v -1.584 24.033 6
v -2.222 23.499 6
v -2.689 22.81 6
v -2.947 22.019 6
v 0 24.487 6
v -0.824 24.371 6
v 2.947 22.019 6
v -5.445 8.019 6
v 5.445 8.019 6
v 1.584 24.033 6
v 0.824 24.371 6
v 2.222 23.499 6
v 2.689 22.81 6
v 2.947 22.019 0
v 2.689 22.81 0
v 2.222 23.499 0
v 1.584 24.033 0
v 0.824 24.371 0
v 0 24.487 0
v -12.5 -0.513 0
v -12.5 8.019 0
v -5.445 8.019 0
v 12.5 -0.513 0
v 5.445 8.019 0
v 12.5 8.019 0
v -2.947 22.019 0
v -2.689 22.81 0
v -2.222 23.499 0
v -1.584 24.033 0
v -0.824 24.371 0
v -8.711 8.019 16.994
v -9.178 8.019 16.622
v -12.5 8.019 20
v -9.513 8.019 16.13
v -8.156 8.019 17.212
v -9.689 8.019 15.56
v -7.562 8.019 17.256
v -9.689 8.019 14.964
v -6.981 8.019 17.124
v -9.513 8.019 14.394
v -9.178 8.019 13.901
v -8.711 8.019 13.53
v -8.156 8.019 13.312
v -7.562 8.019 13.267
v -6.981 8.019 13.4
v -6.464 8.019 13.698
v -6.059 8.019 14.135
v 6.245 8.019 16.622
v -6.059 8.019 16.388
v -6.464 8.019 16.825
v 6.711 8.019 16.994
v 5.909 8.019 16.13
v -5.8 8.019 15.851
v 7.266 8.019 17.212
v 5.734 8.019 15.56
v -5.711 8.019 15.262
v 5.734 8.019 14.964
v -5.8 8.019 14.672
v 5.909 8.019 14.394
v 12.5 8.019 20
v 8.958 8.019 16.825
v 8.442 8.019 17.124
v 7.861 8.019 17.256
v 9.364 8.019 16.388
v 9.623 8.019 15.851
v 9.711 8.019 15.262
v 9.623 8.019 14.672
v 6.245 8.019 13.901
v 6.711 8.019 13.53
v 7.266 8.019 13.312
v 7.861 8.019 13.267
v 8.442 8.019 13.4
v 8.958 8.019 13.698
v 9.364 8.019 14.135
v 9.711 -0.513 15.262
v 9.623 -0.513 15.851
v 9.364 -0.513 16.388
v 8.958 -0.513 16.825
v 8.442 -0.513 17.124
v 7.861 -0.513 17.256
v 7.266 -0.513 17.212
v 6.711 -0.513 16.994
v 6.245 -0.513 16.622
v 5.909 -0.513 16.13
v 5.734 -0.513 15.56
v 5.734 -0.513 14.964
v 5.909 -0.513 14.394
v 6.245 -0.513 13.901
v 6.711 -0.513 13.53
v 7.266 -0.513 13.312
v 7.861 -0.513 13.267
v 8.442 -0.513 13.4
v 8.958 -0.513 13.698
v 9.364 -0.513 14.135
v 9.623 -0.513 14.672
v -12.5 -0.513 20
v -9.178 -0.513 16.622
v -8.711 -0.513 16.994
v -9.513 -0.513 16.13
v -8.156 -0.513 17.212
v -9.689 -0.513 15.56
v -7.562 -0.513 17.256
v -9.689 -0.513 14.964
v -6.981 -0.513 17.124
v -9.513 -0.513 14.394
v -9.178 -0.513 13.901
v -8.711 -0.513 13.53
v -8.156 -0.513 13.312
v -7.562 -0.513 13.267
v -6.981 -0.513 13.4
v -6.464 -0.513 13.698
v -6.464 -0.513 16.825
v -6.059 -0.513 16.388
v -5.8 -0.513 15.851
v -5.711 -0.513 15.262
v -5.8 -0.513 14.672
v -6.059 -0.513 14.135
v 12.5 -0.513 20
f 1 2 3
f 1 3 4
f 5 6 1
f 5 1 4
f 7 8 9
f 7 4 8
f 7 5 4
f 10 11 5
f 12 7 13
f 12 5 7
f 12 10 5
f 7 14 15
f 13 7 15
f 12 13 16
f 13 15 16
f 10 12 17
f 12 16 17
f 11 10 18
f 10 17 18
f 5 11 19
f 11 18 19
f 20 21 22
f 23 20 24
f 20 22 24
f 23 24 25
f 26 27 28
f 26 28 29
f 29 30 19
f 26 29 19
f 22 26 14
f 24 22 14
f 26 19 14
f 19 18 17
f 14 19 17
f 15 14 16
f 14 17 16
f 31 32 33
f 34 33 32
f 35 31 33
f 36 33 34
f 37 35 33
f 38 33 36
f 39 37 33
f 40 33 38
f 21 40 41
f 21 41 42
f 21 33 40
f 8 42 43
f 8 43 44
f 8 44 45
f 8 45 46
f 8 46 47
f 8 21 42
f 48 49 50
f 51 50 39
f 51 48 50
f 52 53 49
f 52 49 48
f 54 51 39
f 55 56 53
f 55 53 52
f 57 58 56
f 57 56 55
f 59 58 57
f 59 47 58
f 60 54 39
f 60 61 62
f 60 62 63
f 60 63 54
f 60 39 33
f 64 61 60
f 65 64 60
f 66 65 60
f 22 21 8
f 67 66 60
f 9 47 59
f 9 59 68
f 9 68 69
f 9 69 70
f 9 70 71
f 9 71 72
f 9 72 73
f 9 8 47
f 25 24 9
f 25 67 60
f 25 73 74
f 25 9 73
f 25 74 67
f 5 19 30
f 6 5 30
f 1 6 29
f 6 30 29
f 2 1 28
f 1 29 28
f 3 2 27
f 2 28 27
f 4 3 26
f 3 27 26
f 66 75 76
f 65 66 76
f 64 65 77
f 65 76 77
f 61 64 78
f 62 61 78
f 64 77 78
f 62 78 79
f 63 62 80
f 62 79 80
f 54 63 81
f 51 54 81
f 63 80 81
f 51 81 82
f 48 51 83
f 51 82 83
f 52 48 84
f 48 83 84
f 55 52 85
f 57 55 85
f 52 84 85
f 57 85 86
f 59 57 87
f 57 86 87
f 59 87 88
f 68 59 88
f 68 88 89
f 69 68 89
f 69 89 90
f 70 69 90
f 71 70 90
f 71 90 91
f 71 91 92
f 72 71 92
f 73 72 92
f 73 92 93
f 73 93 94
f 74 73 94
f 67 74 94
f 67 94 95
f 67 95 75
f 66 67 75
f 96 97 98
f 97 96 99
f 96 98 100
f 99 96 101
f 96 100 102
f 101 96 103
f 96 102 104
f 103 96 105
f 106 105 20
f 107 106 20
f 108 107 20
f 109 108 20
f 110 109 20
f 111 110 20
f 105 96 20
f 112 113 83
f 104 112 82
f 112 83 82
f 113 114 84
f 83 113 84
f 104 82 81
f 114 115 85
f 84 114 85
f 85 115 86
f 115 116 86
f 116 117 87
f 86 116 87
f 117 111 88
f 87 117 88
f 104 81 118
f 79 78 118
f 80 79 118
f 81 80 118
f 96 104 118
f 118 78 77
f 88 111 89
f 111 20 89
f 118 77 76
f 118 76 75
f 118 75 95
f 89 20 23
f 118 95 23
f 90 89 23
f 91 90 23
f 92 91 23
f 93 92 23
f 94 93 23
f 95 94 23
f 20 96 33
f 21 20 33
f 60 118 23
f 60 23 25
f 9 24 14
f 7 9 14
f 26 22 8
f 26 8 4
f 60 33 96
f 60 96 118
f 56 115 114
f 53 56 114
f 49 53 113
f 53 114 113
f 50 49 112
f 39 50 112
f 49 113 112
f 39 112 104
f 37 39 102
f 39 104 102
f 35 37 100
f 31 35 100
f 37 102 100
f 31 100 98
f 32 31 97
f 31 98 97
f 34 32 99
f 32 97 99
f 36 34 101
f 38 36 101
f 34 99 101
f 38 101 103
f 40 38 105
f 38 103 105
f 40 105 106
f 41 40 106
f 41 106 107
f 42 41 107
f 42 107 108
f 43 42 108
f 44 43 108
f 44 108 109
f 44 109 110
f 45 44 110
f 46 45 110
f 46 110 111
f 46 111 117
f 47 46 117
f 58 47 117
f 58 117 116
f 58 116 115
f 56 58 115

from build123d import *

# Parameters (mm, degrees)
PAD_DEPTH    = 6
SKETCH_W     = 25
SKETCH_H     = 8.532326
PAD001_DEPTH = 14
SKETCH002_R  = 2
POCKET_DEPTH = 25.001


with BuildPart() as part:
    # Sketch001 → Pad (new body)
    with BuildSketch(Plane.XY):
        with BuildLine():
            Line((0, -0.513451), (12.5, -0.513451))
            Line((12.5, -0.513451), (12.5, 8.018875))
            Line((12.5, 8.018875), (5.444822, 8.018875))
            Line((5.444822, 8.018875), (2.947073, 22.018734))
            ThreePointArc((2.947073, 22.018734), (1.921936, 23.788122), (0, 24.486549))
            ThreePointArc((0, 24.486549), (-1.921936, 23.788122), (-2.947073, 22.018734))
            Line((-5.444822, 8.018875), (-2.947073, 22.018734))
            Line((-12.5, 8.018875), (-5.444822, 8.018875))
            Line((-12.5, -0.513451), (-12.5, 8.018875))
            Line((0, -0.513451), (-12.5, -0.513451))
        make_face()
    extrude(amount=PAD_DEPTH)

    # Sketch → Pad001 (new body)
    with BuildSketch(Plane.XY.offset(6)):
        with Locations((0, 3.752712)):
            Rectangle(SKETCH_W, SKETCH_H)
    extrude(amount=PAD001_DEPTH)

    # Sketch002 → Pocket (cut, through all)
    with BuildSketch(Plane.XZ.offset(0.513451)):
        with Locations((-7.711432, 15.261821)):
            Circle(SKETCH002_R)
        with Locations((7.711432, 15.261821)):
            Circle(SKETCH002_R)
    extrude(amount=-POCKET_DEPTH, mode=Mode.SUBTRACT)


solid = part.part
